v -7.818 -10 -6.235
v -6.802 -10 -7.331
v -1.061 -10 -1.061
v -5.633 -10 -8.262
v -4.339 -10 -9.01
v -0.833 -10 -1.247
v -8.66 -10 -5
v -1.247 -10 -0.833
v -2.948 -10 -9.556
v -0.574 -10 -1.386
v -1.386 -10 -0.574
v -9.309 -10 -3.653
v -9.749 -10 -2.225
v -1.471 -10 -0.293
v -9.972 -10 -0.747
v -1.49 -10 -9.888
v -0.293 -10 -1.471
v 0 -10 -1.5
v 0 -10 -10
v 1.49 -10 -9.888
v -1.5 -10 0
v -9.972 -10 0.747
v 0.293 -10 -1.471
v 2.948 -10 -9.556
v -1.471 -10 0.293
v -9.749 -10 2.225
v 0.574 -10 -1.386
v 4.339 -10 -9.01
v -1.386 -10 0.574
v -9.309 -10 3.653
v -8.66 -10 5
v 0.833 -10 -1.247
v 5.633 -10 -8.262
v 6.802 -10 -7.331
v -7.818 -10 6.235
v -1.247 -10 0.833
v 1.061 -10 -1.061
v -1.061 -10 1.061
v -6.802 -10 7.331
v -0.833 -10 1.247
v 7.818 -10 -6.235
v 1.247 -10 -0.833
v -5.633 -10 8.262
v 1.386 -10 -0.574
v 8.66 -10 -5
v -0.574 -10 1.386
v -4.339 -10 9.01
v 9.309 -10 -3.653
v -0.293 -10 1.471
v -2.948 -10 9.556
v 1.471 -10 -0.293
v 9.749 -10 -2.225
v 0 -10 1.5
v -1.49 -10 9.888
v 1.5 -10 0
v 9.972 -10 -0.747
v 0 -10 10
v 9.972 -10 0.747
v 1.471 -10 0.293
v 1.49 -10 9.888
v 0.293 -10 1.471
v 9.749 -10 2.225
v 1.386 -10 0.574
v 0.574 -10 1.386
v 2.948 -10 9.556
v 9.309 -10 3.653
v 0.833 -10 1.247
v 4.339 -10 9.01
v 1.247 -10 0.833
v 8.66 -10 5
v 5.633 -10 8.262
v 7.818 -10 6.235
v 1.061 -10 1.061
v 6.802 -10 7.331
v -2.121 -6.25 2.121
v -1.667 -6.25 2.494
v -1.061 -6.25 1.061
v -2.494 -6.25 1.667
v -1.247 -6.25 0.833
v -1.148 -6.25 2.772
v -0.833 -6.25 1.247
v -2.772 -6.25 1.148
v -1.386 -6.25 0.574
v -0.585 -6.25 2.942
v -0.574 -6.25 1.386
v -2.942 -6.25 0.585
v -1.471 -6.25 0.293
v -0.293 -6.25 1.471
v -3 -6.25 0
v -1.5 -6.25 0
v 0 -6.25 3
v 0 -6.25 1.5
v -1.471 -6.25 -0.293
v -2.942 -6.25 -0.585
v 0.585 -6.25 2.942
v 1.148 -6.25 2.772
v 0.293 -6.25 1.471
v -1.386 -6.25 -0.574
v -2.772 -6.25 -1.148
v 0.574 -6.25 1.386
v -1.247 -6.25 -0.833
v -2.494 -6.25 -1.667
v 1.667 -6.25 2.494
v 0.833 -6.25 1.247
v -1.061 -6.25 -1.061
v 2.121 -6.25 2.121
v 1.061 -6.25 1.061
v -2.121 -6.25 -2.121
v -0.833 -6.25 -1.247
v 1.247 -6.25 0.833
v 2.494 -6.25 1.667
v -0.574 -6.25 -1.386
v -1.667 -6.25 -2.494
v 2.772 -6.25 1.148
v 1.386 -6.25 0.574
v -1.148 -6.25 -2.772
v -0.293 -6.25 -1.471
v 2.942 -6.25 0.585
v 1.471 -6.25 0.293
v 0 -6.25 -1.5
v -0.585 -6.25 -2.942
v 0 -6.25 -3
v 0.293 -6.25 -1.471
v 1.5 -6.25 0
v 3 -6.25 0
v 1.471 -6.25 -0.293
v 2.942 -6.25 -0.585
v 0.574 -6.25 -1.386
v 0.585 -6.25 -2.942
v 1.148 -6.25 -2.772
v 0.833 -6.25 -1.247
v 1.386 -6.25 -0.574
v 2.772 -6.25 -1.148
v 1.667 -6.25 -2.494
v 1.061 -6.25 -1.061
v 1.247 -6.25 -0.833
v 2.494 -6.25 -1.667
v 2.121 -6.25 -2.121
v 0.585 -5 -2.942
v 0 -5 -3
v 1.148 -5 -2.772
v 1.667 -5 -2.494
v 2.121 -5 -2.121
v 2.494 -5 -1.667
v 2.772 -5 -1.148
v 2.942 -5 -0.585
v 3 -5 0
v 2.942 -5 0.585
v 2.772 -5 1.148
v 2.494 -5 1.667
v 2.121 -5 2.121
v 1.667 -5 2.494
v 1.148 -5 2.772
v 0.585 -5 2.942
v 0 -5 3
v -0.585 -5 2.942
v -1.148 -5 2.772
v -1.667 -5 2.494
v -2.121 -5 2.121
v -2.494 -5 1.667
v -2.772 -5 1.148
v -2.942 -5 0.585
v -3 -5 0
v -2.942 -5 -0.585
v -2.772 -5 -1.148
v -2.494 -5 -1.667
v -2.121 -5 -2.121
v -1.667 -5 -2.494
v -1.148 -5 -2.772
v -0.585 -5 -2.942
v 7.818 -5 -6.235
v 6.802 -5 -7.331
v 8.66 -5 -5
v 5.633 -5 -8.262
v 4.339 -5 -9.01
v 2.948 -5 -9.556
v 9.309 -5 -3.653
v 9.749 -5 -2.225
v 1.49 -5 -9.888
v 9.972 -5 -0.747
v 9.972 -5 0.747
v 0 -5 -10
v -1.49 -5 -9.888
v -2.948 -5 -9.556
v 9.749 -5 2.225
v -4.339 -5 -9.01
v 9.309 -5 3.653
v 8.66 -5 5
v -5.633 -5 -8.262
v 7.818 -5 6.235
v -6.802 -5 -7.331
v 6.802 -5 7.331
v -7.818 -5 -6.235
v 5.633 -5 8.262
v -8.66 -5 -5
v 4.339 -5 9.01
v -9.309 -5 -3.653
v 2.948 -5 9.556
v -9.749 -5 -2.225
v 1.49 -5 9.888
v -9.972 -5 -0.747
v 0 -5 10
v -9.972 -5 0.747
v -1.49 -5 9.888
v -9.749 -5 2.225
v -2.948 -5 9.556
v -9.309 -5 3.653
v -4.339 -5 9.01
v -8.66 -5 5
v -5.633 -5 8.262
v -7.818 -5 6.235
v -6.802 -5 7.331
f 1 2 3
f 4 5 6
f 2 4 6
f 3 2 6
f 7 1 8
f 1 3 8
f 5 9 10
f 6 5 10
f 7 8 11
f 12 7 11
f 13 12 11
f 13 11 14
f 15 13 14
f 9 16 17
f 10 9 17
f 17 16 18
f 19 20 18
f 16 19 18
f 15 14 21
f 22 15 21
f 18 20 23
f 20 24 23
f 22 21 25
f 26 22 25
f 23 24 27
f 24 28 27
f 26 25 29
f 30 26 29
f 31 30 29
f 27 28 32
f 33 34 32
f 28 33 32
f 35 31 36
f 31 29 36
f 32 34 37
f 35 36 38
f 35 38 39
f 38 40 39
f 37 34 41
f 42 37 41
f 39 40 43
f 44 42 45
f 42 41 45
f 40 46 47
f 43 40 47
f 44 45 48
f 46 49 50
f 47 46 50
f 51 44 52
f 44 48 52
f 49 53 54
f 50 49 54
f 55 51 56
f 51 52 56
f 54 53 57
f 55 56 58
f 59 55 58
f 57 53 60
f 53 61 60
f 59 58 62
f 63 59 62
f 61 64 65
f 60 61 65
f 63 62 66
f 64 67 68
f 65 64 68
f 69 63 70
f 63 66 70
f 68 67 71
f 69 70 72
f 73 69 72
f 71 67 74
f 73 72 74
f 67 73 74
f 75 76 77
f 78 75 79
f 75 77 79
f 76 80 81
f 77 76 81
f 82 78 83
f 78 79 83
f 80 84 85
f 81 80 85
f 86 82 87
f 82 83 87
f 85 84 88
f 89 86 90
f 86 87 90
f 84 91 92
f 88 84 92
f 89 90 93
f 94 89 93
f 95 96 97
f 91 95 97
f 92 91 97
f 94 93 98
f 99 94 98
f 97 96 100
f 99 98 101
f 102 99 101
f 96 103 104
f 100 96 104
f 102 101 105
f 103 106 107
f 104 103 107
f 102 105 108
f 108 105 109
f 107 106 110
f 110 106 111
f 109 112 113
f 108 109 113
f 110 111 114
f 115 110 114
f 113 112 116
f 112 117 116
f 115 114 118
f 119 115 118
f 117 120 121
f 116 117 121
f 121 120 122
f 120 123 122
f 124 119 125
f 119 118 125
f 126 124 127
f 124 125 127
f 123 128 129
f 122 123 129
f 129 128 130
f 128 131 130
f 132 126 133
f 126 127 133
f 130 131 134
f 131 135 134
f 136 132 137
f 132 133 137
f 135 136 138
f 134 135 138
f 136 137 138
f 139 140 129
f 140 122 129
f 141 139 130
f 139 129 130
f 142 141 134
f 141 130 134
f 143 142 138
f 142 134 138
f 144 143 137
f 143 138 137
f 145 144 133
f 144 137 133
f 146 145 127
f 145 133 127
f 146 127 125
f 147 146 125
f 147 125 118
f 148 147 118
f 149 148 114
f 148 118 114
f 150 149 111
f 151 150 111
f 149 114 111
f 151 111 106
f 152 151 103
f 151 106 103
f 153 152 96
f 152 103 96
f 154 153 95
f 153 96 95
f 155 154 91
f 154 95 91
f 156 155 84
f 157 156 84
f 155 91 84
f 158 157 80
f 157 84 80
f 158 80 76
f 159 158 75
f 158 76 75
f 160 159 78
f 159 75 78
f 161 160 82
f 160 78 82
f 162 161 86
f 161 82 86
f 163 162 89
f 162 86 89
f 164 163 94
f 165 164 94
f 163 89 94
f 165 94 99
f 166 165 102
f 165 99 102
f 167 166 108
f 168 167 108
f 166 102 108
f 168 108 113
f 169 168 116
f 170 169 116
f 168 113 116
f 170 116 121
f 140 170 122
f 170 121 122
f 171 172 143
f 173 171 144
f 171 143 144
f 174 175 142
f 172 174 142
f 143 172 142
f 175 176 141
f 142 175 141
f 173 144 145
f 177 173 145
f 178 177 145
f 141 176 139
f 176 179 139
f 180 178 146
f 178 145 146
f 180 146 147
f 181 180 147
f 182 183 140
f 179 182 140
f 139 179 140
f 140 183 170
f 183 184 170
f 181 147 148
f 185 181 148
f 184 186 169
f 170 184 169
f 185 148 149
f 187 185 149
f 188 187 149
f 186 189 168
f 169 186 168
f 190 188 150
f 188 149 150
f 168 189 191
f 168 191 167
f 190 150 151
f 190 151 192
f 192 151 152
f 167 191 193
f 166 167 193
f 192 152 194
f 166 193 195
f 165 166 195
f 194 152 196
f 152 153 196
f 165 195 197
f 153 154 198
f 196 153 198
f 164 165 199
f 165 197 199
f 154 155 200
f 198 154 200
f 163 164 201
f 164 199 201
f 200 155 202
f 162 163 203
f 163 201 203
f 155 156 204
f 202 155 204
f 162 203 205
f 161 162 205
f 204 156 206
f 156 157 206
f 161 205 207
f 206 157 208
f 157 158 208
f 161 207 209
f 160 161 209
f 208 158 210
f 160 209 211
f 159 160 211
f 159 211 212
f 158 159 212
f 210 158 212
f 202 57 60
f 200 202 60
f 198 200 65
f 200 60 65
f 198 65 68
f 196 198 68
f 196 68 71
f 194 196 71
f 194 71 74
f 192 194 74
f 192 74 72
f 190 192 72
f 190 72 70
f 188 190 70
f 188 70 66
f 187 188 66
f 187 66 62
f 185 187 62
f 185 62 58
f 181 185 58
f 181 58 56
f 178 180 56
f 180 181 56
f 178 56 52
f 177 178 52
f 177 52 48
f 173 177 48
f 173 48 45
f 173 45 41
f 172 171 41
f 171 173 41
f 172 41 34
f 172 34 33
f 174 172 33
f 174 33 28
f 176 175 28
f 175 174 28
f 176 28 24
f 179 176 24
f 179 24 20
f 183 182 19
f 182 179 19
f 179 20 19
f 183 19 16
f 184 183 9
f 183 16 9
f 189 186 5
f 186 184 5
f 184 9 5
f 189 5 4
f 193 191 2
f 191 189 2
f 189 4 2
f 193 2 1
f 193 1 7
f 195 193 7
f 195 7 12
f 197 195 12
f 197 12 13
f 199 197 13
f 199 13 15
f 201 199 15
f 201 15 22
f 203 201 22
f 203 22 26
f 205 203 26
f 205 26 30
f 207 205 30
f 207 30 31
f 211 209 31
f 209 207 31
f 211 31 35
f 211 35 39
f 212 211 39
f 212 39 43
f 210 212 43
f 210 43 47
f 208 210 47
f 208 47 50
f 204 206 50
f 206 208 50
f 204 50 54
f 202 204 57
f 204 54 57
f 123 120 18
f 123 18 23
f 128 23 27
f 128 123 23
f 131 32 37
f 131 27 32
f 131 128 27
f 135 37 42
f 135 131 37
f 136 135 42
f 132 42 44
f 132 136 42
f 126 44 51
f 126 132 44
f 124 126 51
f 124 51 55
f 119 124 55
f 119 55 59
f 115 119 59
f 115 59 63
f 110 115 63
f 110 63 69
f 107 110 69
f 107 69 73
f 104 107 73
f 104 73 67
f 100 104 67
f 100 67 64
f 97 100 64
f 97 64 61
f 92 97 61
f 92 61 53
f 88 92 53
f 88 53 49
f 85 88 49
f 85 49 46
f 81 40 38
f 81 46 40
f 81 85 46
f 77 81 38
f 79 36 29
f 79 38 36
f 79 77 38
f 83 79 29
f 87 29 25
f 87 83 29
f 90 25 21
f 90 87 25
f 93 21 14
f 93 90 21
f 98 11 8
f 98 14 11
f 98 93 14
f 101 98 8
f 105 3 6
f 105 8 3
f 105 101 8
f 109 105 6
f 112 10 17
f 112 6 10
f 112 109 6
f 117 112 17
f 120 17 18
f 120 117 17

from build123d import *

# Parameters (mm, degrees)
BOSS_EXTRUDE1_DEPTH      = 3
BOSS_EXTRUDE1_DEPTH_BACK = 10
SKETCH1_R                = 10
SKETCH4_R                = 1.5
HOLE_DEPTH               = 20.973741561
HOLECIR_COUNT            = 5
SKETCH6_R                = 3
BEARINGHOLE_DEPTH        = 1.25
SKETCH7_R                = 1.5
SHAFTHOLE_DEPTH          = 17.248076982
SKETCH13_R               = 10
BOTTEN_HALF_DEPTH        = 10


with BuildPart() as part:
    # Sketch1 → Boss-Extrude1 (new, two sides: drawn at the far end of the back side and taken through both)
    with BuildSketch(Plane(origin=(0, 0, 0), x_dir=(1, 0, 0), z_dir=(0, 1, 0)).offset(-BOSS_EXTRUDE1_DEPTH_BACK)):
        Circle(SKETCH1_R)
    extrude(amount=BOSS_EXTRUDE1_DEPTH + BOSS_EXTRUDE1_DEPTH_BACK)

    # Sketch4 → hole (cut, through all)
    with BuildSketch(Plane(origin=(-3.352872105, -1.093066116, 1.887711608), x_dir=(-0.4486862613641547, -0.14627571033740308, -0.8816371449912632), z_dir=(0.8382180262940947, 0.2732665289126682, -0.47192790187872385))):
        Circle(SKETCH4_R)
    hole = extrude(amount=-HOLE_DEPTH, mode=Mode.SUBTRACT)

    # holecir: hole ×5 about axis
    holecir_axis = Axis((0, 5.5, 0), (0, -1, 0))
    for i in range(1, HOLECIR_COUNT):
        add(hole.rotate(holecir_axis, i * 360 / HOLECIR_COUNT), mode=Mode.SUBTRACT)

    # Sketch6 → bearinghole (cut, symmetric)
    with BuildSketch(Plane(origin=(0, -5, 0), x_dir=(-1, 0, 0), z_dir=(0, -1, 0))):
        Circle(SKETCH6_R)
    extrude(amount=BEARINGHOLE_DEPTH, both=True, mode=Mode.SUBTRACT)

    # Sketch7 → shafthole (cut, through all)
    with BuildSketch(Plane(origin=(0, -5, 0), x_dir=(-1, 0, 0), z_dir=(0, -1, 0))):
        Circle(SKETCH7_R)
    extrude(amount=SHAFTHOLE_DEPTH, mode=Mode.SUBTRACT)

    # Sketch13 → botten half (cut)
    with BuildSketch(Plane(origin=(0, -5, 0), x_dir=(-1, 0, 0), z_dir=(0, -1, 0))):
        Circle(SKETCH13_R)
    extrude(amount=-BOTTEN_HALF_DEPTH, mode=Mode.SUBTRACT)


solid = part.part
